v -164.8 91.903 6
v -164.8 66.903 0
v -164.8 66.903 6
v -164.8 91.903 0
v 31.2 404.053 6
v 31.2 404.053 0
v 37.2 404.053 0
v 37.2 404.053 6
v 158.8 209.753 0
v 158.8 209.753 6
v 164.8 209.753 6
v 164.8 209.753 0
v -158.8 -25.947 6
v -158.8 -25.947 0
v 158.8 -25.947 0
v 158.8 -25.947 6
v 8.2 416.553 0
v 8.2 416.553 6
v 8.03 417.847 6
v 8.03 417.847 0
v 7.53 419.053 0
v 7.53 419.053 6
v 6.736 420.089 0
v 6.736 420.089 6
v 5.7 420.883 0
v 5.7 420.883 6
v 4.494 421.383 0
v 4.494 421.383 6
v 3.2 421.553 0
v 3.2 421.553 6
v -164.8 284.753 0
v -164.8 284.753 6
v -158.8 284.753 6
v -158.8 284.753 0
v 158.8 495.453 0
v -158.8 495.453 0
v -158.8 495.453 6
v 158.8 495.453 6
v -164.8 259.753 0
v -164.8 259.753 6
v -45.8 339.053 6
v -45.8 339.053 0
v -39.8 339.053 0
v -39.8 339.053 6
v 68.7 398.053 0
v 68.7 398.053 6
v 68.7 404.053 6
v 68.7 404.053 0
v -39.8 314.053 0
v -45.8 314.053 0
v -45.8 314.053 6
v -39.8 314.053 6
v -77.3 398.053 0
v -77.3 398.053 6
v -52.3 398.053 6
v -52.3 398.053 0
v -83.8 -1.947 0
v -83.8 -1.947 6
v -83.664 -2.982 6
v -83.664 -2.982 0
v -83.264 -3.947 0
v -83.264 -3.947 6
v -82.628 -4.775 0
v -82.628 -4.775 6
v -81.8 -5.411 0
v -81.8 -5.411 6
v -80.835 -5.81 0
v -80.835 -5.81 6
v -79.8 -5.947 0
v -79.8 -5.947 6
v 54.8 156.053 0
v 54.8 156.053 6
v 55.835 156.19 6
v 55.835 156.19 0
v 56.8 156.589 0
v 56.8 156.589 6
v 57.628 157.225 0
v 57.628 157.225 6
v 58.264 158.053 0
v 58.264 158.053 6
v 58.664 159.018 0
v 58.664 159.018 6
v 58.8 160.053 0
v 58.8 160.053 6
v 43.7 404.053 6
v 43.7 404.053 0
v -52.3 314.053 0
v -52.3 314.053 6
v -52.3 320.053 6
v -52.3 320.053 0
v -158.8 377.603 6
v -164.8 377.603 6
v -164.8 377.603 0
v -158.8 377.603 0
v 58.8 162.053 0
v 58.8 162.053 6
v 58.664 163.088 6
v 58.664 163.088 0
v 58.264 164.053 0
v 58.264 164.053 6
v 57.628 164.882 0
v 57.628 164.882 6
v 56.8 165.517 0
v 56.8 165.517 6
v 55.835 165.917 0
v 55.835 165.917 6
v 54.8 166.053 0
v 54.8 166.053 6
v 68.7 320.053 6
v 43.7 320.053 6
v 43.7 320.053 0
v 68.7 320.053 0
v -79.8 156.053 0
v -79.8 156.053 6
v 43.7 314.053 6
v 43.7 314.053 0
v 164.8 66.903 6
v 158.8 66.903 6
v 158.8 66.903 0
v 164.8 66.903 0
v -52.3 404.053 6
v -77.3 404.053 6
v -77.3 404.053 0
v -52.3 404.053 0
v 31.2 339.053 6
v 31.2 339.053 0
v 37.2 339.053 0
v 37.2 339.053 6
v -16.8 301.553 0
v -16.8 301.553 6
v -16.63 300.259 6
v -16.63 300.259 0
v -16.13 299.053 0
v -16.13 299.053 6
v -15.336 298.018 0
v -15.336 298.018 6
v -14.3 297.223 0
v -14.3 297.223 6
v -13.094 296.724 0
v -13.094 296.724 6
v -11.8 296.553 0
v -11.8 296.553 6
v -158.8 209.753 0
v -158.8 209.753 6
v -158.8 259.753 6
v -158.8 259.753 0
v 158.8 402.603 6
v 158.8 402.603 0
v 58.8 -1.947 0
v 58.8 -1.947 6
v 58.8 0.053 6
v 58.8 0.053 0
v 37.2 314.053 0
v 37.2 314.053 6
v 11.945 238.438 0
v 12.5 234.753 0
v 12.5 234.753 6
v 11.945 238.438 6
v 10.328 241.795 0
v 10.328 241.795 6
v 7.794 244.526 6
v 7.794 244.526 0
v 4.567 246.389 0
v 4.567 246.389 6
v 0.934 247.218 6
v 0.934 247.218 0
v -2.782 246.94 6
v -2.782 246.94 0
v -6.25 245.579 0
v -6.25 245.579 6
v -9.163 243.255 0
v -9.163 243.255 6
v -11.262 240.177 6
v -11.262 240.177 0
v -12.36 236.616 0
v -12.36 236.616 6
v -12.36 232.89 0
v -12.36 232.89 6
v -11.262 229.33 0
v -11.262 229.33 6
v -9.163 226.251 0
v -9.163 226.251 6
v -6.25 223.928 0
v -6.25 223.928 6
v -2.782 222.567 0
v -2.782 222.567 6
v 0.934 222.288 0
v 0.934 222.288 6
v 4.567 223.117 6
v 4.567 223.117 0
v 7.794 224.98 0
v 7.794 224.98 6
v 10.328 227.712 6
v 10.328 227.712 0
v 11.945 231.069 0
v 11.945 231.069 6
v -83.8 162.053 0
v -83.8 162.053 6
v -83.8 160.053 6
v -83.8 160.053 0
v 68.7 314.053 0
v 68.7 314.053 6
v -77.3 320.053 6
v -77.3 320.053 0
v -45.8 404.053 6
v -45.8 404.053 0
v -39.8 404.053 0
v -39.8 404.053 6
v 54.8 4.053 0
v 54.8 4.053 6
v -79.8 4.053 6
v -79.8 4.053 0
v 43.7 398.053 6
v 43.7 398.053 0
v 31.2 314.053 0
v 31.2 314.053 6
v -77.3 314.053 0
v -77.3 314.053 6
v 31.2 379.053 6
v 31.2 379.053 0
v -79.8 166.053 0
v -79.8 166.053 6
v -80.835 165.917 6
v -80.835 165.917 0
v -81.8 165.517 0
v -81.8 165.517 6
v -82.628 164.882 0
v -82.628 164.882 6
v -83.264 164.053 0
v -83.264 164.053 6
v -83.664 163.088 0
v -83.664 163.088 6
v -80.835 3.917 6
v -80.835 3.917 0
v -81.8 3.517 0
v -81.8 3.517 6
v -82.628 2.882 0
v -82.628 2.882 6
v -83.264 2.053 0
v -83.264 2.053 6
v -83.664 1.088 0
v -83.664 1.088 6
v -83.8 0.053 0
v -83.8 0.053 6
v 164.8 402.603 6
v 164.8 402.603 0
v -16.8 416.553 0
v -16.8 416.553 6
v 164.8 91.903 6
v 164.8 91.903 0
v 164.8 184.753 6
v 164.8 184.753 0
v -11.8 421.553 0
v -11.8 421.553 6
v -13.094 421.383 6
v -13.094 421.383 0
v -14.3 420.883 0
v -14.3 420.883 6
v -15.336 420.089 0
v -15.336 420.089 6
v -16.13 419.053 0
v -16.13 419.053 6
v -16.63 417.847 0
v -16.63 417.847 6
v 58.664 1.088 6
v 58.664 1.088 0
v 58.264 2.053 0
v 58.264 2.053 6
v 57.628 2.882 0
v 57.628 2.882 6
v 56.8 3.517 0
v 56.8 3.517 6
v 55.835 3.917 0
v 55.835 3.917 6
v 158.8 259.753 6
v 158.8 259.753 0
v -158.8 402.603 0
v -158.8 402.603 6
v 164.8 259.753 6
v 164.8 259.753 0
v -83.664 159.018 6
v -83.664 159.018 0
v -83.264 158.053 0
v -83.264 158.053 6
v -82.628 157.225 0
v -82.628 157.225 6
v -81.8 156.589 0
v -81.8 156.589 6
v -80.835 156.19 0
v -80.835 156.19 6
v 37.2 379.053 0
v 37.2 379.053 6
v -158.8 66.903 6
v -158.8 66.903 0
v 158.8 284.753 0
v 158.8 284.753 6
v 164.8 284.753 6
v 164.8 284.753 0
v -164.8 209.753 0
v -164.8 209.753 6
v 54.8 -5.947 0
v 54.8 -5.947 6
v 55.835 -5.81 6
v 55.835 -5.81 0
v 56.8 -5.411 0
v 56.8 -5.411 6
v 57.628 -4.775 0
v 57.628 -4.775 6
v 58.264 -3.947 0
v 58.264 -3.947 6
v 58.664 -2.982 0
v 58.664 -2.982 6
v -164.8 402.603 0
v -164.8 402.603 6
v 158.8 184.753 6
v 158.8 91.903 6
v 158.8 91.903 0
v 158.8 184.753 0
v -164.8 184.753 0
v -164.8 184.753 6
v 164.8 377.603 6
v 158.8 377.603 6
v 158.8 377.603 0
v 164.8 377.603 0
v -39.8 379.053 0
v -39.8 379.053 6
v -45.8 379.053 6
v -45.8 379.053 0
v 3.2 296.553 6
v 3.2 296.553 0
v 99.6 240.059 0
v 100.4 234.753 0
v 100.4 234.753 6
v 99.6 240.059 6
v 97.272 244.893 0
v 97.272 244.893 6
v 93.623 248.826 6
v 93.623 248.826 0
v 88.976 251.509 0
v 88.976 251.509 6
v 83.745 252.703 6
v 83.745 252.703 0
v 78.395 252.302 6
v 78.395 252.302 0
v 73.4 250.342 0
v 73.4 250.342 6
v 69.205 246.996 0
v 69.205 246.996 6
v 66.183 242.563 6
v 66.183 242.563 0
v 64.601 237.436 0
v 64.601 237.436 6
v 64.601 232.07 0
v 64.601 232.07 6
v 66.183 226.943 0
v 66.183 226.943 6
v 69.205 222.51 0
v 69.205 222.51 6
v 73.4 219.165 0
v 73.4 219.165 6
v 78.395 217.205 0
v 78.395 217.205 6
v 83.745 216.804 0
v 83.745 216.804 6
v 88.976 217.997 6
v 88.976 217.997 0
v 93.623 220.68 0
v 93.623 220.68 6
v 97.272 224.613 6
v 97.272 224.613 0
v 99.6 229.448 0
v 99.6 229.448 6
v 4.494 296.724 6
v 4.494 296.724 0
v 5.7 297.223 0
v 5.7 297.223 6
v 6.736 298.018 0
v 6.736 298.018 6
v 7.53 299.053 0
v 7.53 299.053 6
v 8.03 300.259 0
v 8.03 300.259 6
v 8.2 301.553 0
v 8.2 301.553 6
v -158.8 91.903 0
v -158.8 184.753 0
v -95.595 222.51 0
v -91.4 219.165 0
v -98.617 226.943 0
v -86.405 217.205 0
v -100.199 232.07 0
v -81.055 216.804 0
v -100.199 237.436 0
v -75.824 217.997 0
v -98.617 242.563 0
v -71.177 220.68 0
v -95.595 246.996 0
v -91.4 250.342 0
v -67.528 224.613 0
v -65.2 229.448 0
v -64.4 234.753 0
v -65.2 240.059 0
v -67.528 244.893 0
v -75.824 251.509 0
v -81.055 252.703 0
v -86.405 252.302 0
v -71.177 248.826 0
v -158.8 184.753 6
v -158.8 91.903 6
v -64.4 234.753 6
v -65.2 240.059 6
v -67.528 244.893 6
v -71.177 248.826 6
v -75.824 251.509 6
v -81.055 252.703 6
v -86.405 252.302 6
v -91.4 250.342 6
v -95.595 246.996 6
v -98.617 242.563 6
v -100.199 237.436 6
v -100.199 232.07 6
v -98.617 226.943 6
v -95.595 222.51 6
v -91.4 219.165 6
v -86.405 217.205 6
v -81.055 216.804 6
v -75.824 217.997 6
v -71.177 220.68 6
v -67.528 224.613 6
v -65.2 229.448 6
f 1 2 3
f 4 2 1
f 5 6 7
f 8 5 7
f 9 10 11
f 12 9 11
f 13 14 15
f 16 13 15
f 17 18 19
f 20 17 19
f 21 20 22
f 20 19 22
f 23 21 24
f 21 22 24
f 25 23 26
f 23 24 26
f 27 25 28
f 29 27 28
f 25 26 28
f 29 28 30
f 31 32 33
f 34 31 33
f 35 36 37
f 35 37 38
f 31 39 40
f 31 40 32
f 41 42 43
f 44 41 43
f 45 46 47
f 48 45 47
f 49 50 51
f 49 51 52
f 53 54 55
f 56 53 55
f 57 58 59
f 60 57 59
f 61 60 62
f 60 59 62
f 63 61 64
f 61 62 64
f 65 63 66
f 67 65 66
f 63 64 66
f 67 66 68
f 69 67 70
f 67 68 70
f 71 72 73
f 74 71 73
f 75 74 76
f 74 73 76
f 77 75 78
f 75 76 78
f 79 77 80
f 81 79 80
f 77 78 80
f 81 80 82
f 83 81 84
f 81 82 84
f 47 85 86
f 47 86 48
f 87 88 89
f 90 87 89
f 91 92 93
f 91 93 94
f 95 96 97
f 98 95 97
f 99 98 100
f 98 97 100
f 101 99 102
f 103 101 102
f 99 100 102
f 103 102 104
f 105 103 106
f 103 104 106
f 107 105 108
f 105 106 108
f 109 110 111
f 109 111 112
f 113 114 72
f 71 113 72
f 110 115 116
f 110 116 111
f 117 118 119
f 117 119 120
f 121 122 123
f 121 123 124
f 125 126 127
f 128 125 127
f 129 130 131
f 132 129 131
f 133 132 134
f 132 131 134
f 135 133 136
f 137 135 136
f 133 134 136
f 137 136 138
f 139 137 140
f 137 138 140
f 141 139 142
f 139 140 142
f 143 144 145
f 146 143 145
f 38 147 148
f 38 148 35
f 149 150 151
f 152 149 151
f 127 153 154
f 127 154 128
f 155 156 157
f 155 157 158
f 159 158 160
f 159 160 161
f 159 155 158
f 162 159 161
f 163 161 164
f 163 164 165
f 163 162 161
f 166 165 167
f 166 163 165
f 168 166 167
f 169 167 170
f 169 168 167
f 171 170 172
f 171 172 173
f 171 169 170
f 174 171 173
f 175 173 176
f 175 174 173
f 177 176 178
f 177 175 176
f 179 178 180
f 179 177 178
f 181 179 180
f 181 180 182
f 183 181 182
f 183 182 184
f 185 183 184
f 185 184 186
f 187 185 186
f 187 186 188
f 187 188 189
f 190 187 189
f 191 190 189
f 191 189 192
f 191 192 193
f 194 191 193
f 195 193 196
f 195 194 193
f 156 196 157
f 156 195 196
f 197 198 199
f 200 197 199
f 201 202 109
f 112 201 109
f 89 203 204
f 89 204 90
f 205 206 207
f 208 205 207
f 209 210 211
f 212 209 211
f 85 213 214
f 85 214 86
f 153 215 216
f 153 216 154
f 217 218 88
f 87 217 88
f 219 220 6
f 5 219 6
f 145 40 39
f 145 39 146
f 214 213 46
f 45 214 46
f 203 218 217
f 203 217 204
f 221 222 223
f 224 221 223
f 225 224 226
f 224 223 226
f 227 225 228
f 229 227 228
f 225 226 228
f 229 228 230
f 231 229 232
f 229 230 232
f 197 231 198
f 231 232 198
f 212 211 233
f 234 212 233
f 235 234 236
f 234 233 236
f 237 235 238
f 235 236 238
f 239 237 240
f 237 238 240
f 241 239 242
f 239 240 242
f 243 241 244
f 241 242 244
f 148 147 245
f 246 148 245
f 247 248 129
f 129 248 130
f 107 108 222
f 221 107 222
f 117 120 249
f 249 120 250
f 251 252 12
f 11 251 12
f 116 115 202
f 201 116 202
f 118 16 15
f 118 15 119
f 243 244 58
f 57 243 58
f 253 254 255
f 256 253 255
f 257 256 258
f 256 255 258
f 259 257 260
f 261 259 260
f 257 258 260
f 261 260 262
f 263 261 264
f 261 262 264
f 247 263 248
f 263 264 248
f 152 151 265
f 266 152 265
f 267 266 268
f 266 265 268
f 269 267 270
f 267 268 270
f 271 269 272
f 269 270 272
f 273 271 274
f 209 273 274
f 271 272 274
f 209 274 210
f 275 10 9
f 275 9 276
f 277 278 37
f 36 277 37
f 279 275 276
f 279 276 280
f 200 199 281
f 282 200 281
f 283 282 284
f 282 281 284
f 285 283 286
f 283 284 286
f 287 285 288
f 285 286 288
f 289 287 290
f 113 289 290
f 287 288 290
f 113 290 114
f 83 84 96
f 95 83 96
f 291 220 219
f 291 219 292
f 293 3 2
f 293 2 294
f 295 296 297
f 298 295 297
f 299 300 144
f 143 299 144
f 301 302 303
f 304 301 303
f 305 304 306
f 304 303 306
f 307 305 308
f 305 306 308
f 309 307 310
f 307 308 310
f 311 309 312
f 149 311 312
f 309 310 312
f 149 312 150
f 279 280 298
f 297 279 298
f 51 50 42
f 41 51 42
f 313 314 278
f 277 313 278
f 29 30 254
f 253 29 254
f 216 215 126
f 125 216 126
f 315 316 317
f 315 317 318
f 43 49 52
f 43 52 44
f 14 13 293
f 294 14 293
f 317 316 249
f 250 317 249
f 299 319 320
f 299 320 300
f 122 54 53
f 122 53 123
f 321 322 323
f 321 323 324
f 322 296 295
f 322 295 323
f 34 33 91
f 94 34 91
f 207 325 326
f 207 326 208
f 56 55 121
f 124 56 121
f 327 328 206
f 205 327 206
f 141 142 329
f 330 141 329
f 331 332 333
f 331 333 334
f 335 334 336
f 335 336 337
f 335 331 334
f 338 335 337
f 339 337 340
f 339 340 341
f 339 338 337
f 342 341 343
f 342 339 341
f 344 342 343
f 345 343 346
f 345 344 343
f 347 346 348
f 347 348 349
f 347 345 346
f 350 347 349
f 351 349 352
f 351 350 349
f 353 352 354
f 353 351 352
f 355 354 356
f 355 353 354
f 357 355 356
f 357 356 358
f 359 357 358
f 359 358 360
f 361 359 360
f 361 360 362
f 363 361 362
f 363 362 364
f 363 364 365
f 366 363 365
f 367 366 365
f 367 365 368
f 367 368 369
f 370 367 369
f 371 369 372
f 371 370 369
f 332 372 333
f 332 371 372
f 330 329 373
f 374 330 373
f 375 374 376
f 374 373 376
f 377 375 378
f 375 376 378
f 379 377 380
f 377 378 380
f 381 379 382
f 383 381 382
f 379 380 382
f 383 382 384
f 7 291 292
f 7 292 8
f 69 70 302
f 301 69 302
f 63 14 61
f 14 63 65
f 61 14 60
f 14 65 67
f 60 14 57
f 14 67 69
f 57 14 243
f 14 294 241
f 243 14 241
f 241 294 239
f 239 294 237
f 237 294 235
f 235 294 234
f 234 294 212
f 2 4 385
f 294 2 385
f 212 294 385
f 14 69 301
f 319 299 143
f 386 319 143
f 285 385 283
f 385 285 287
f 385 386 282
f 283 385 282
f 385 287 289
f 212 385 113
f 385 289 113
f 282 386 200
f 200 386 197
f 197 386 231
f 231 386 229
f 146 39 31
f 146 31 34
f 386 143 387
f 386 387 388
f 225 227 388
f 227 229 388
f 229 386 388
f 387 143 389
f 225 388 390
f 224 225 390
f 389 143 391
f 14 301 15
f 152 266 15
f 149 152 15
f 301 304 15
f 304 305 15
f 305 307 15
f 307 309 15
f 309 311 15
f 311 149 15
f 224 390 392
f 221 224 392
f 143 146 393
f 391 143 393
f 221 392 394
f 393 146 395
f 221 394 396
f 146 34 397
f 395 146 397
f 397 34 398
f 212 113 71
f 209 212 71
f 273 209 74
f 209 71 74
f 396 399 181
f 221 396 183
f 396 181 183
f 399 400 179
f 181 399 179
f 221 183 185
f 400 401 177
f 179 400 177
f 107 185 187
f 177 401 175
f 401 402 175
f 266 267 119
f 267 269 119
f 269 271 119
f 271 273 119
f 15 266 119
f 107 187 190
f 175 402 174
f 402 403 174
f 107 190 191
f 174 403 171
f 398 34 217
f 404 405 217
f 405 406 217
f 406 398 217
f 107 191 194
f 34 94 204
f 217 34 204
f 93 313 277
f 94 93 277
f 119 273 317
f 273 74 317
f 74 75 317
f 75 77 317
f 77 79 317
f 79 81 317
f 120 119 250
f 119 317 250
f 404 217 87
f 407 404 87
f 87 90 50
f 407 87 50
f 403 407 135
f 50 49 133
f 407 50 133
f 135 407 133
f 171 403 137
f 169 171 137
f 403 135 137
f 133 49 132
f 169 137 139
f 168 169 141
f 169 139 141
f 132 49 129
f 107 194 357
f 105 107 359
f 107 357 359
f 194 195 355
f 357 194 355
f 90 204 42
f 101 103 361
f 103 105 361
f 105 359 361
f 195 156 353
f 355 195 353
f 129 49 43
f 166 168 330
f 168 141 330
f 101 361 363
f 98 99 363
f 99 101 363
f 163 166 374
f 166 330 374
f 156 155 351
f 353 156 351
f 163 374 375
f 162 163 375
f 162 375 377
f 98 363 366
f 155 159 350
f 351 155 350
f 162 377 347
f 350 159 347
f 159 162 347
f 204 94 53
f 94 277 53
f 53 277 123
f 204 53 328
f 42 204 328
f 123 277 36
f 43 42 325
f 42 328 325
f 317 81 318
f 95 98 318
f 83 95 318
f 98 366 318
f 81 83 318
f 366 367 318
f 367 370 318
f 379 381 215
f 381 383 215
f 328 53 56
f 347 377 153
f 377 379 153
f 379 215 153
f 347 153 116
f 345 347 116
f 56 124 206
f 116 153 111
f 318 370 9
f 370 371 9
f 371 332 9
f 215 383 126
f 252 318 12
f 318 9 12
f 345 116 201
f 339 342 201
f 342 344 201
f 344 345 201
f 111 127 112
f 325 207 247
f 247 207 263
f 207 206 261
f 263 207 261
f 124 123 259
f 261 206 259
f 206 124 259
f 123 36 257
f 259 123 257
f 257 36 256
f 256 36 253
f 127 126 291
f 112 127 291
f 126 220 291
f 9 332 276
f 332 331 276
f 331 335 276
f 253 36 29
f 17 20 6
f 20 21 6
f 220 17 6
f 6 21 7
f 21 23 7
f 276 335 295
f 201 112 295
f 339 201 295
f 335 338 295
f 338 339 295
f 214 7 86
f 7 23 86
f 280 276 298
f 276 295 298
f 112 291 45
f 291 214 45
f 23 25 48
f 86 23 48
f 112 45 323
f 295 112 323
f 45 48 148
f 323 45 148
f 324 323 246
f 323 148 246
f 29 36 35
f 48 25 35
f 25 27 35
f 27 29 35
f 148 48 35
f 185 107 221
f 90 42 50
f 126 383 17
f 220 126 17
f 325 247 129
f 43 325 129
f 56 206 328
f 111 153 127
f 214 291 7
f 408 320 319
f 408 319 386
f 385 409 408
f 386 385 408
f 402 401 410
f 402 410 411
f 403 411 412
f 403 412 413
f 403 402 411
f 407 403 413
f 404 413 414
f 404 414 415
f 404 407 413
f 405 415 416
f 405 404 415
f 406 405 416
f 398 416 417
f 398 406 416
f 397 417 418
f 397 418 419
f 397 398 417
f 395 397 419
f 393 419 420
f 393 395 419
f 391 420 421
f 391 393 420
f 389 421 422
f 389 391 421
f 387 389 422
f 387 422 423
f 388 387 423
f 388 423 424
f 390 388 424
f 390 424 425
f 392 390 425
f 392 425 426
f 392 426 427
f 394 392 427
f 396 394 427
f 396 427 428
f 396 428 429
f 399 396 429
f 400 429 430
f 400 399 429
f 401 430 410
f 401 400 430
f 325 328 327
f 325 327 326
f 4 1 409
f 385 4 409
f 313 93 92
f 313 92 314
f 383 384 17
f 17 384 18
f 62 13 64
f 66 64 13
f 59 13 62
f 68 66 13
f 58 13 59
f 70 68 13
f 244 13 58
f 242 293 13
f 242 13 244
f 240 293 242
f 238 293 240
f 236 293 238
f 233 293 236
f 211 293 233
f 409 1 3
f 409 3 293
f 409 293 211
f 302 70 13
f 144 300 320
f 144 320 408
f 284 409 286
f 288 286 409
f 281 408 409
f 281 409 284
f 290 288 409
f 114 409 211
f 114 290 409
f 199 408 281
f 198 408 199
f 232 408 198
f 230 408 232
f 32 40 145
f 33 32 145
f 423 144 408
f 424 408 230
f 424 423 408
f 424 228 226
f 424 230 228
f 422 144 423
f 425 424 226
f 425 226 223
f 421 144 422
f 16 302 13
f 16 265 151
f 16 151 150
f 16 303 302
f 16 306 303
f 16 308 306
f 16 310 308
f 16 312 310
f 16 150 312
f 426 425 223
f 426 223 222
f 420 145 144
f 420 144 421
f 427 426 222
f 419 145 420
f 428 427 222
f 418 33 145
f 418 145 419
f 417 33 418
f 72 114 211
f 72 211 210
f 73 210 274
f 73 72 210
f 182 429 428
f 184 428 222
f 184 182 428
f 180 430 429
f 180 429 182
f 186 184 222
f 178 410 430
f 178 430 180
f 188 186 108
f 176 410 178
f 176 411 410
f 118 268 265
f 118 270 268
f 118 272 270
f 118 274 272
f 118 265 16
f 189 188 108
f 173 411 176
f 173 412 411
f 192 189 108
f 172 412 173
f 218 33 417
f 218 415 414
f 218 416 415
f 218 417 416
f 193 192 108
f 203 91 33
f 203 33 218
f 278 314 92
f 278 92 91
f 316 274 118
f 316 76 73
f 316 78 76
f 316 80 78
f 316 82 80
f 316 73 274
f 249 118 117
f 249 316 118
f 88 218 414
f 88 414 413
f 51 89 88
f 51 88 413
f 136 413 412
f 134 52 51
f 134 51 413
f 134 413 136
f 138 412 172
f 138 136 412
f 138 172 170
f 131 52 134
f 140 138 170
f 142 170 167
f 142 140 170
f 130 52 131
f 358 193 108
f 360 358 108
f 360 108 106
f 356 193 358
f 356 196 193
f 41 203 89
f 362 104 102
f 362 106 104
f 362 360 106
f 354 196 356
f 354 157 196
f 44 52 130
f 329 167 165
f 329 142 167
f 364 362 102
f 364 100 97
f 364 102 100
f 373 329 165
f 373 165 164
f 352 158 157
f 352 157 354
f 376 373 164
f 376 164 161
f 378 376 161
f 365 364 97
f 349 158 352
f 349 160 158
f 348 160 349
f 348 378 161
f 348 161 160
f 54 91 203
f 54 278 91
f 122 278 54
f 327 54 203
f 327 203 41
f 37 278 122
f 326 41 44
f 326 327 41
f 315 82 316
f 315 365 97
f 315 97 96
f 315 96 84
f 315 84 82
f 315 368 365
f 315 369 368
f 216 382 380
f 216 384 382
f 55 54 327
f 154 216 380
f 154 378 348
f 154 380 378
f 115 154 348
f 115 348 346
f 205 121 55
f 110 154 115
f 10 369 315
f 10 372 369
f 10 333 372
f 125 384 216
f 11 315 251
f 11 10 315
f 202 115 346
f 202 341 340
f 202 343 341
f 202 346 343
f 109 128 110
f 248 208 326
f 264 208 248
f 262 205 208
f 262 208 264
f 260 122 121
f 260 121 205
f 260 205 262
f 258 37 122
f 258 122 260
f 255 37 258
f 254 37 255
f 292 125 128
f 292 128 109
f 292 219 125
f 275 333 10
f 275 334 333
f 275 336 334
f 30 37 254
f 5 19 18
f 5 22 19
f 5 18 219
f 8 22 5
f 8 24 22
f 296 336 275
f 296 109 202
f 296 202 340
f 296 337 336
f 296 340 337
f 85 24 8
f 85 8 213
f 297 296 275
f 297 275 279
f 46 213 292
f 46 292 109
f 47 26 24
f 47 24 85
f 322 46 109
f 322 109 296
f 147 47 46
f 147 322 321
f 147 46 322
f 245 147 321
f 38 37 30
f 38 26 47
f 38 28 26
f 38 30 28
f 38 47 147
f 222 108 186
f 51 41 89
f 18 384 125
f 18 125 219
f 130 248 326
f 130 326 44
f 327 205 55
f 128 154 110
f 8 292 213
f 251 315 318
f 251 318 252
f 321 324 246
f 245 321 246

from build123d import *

# Parameters (mm, degrees)
F0_W     = 329.6
F0_H     = 521.4
F0_R     = 18
F0_W_2   = 6
F0_H_2   = 25
F0_R_2   = 12.5
F1_DEPTH = 6
F2_W     = 6
F2_H     = 92.85
F2_H_2   = 50
F3_DEPTH = 25
F5_W     = 25
F5_H     = 6
F6_DEPTH = 25
F7_DEPTH = 25


with BuildPart() as f1:
    # F0 (on Top) → F1 (new body)
    with BuildSketch(Plane.XY):
        with Locations((0, 234.753206)):
            Rectangle(F0_W, F0_H)
        with Locations((-82.4, 234.753206)):
            Circle(F0_R, mode=Mode.SUBTRACT)
        with Locations((-42.8, 326.553206)):
            Rectangle(F0_W_2, F0_H_2, mode=Mode.SUBTRACT)
        with Locations((-42.8, 391.553206)):
            Rectangle(F0_W_2, F0_H_2, mode=Mode.SUBTRACT)
        with Locations((0, 234.753206)):
            Circle(F0_R_2, mode=Mode.SUBTRACT)
        with Locations((34.2, 326.553206)):
            Rectangle(F0_W_2, F0_H_2, mode=Mode.SUBTRACT)
        with Locations((82.4, 234.753206)):
            Circle(F0_R, mode=Mode.SUBTRACT)
        with Locations((34.2, 391.553206)):
            Rectangle(F0_W_2, F0_H_2, mode=Mode.SUBTRACT)
    extrude(amount=F1_DEPTH)

    # F2 (on face) → F3 (cut)
    with BuildSketch(Plane.XY.offset(6)):
        with Locations((-161.8, 449.028206)):
            Rectangle(F2_W, F2_H)
        with Locations((-161.8, 331.178206)):
            Rectangle(F2_W, F2_H)
        with Locations((-161.8, 234.753206)):
            Rectangle(F2_W, F2_H_2)
        with Locations((-161.8, 138.328206)):
            Rectangle(F2_W, F2_H)
        with Locations((-161.8, 20.478206)):
            Rectangle(F2_W, F2_H)
        with Locations((161.8, 449.028206)):
            Rectangle(F2_W, F2_H)
        with Locations((161.8, 20.478206)):
            Rectangle(F2_W, F2_H)
        with Locations((161.8, 138.328206)):
            Rectangle(F2_W, F2_H)
        with Locations((161.8, 331.178206)):
            Rectangle(F2_W, F2_H)
        with Locations((161.8, 234.753206)):
            Rectangle(F2_W, F2_H_2)
    extrude(amount=-F3_DEPTH, mode=Mode.SUBTRACT)

    # F5 (on face) → F6 (cut)
    with BuildSketch(Plane.XY.offset(6)):
        with Locations((-64.8, 317.053206)):
            Rectangle(F5_W, F5_H)
        with Locations((-64.8, 401.053206)):
            Rectangle(F5_W, F5_H)
        with Locations((56.2, 401.053206)):
            Rectangle(F5_W, F5_H)
        with Locations((56.2, 317.053206)):
            Rectangle(F5_W, F5_H)
        with BuildLine():
            Line((3.2, 421.553206), (-11.8, 421.553206))
            ThreePointArc((-11.8, 421.553206), (-15.335534, 420.08874), (-16.8, 416.553206))
            Line((-16.8, 416.553206), (-16.8, 301.553206))
            ThreePointArc((-16.8, 301.553206), (-15.335534, 298.017672), (-11.8, 296.553206))
            Line((-11.8, 296.553206), (3.2, 296.553206))
            ThreePointArc((3.2, 296.553206), (6.735534, 298.017672), (8.2, 301.553206))
            Line((8.2, 301.553206), (8.2, 416.553206))
            ThreePointArc((8.2, 416.553206), (6.735534, 420.08874), (3.2, 421.553206))
        make_face()
    extrude(amount=-F6_DEPTH, mode=Mode.SUBTRACT)

    # F4 (on face) → F7 (cut)
    with BuildSketch(Plane.XY.offset(6)):
        with BuildLine():
            Line((54.8, 166.053206), (-79.8, 166.053206))
            ThreePointArc((-79.8, 166.053206), (-82.628427, 164.881633), (-83.8, 162.053206))
            Line((-83.8, 162.053206), (-83.8, 160.053206))
            ThreePointArc((-83.8, 160.053206), (-82.628427, 157.224779), (-79.8, 156.053206))
            Line((-79.8, 156.053206), (54.8, 156.053206))
            ThreePointArc((54.8, 156.053206), (57.628427, 157.224779), (58.8, 160.053206))
            Line((58.8, 160.053206), (58.8, 162.053206))
            ThreePointArc((58.8, 162.053206), (57.628427, 164.881633), (54.8, 166.053206))
        make_face()
        with BuildLine():
            Line((54.8, 4.053206), (-79.8, 4.053206))
            ThreePointArc((-79.8, 4.053206), (-82.628427, 2.881633), (-83.8, 0.053206))
            Line((-83.8, 0.053206), (-83.8, -1.946794))
            ThreePointArc((-83.8, -1.946794), (-82.628427, -4.775221), (-79.8, -5.946794))
            Line((-79.8, -5.946794), (54.8, -5.946794))
            ThreePointArc((54.8, -5.946794), (57.628427, -4.775221), (58.8, -1.946794))
            Line((58.8, -1.946794), (58.8, 0.053206))
            ThreePointArc((58.8, 0.053206), (57.628427, 2.881633), (54.8, 4.053206))
        make_face()
    extrude(amount=-F7_DEPTH, mode=Mode.SUBTRACT)


solid = f1.part
